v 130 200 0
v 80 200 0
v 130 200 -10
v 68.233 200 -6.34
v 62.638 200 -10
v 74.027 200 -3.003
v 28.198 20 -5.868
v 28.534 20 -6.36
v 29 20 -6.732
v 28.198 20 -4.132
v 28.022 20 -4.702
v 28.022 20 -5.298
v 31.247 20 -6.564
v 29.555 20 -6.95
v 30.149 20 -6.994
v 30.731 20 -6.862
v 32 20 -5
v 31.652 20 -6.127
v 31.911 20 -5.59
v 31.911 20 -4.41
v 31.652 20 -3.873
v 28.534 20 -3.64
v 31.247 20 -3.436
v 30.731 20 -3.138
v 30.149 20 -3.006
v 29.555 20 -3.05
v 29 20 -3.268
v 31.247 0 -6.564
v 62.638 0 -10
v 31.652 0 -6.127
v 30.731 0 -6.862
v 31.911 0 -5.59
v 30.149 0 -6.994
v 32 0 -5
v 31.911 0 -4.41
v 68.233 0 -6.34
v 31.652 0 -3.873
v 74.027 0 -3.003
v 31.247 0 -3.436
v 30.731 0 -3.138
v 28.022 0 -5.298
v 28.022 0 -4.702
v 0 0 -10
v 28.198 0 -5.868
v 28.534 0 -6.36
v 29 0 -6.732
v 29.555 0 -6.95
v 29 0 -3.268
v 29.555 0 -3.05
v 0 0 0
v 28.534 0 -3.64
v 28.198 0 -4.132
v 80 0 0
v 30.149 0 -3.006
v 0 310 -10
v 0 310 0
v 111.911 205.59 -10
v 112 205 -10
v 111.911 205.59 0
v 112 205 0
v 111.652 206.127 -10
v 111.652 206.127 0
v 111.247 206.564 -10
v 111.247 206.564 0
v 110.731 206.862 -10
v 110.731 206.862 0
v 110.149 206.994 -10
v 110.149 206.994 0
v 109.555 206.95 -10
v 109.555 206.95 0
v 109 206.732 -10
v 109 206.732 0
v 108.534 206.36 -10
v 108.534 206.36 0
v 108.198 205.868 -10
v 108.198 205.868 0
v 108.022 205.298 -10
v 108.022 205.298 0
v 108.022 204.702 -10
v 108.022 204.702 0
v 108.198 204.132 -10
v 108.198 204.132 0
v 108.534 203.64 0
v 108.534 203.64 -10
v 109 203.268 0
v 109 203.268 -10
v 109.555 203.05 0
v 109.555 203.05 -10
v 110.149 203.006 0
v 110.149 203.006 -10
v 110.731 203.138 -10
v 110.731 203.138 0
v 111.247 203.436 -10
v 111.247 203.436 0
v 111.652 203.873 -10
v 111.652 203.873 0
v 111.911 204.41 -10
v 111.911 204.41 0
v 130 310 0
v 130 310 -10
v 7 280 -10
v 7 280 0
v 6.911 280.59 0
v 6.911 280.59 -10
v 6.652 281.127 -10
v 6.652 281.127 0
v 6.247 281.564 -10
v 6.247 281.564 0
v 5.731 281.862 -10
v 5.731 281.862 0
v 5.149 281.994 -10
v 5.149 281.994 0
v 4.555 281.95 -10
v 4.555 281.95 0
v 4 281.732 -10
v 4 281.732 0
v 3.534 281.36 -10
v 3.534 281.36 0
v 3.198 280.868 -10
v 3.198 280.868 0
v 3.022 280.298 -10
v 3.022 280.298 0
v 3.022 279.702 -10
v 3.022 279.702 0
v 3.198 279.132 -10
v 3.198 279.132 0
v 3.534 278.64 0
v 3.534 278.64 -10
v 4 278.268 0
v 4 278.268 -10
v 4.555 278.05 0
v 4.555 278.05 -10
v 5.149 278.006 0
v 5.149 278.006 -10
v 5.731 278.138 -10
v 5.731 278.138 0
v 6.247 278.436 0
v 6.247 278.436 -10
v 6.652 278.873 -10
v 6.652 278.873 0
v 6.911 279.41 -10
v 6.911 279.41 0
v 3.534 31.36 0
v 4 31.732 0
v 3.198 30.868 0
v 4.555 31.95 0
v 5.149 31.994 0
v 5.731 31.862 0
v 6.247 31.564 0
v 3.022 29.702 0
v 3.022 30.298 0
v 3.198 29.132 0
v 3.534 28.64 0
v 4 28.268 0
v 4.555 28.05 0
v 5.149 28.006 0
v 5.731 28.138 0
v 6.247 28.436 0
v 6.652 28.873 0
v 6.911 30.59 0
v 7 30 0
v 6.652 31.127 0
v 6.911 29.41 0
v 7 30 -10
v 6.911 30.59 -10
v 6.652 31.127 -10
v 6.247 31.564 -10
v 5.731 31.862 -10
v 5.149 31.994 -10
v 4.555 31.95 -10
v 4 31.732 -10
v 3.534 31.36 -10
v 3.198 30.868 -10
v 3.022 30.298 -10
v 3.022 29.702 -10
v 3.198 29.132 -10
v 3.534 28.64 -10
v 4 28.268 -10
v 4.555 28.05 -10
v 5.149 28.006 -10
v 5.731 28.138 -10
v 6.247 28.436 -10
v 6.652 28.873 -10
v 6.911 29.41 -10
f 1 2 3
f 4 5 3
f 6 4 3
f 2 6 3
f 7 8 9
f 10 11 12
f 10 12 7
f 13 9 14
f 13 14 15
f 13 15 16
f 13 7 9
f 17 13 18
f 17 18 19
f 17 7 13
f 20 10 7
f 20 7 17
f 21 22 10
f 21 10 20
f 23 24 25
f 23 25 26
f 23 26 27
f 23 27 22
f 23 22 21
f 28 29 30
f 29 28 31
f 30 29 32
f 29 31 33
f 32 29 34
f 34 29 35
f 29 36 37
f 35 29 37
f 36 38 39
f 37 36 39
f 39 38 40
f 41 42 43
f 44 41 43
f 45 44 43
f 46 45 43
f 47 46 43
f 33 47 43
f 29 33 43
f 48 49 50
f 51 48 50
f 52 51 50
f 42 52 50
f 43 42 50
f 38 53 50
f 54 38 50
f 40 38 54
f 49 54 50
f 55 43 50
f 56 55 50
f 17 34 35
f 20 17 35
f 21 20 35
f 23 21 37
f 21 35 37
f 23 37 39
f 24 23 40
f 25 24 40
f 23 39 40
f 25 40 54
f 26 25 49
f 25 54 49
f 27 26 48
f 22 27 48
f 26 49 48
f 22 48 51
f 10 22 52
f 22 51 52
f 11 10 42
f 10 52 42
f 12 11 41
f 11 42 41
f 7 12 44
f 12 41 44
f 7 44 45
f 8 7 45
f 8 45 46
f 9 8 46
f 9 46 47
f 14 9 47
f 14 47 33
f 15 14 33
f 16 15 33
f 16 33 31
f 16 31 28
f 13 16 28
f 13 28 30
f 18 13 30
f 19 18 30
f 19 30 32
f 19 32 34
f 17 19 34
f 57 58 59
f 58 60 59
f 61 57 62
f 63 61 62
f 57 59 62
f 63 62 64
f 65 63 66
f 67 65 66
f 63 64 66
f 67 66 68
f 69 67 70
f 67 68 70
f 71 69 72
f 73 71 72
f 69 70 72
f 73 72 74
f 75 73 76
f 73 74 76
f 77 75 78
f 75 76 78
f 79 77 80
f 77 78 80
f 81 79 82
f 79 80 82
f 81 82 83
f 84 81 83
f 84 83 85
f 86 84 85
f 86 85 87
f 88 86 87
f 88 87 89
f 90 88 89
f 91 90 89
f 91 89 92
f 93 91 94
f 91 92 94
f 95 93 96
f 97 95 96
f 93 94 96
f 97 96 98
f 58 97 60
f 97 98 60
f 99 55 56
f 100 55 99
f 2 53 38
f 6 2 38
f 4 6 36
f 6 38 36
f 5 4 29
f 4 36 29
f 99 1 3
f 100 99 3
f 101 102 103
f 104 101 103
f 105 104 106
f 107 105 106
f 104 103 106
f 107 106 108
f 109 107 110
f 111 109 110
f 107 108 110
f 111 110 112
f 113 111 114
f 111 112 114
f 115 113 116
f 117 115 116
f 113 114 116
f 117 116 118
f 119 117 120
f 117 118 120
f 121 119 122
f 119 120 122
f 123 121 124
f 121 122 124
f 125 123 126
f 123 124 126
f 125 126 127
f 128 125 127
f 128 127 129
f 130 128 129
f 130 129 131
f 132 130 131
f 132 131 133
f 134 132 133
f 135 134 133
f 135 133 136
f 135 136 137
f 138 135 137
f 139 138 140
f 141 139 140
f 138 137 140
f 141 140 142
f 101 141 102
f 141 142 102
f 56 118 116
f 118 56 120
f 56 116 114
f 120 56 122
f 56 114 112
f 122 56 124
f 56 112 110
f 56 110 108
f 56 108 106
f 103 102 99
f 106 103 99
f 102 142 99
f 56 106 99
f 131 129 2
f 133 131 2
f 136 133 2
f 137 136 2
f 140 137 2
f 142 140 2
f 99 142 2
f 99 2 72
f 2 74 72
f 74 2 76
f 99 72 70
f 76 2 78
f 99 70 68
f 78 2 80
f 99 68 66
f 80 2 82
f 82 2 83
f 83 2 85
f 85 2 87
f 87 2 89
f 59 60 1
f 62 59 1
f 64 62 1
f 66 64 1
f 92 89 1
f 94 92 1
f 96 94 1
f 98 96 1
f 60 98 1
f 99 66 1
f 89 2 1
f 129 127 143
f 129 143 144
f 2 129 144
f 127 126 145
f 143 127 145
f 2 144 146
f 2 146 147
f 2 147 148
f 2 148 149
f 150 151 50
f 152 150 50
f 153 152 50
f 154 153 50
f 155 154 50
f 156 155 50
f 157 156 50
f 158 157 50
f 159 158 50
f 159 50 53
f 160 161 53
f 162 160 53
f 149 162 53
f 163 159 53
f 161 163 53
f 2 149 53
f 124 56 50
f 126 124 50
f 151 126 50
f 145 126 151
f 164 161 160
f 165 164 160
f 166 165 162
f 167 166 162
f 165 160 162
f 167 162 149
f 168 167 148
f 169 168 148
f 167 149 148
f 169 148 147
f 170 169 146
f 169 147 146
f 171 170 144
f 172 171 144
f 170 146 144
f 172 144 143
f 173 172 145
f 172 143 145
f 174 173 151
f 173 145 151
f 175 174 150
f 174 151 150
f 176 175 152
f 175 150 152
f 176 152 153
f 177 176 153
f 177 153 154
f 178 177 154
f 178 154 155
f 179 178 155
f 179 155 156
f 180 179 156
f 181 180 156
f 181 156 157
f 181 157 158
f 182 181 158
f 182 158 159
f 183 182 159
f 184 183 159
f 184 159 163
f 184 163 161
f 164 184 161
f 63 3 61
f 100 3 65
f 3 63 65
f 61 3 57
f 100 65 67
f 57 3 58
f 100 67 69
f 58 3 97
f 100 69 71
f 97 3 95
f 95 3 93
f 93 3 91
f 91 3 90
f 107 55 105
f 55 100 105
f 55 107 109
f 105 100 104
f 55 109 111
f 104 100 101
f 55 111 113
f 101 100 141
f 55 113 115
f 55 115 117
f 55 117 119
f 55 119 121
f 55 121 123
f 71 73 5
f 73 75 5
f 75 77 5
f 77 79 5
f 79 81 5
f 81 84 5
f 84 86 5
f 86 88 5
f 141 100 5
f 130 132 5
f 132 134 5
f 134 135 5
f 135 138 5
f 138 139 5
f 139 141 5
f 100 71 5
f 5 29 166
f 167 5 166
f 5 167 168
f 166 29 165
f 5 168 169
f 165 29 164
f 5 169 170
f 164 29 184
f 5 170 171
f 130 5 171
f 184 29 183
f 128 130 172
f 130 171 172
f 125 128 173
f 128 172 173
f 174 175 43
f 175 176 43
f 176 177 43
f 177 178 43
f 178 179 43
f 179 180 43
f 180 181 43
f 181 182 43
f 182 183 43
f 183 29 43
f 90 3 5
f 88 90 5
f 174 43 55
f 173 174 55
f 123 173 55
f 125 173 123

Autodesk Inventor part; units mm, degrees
ref_plane "YZ Plane" through (0, 0, 0) normal (1, 0, 0) x (0, 1, 0)
ref_plane "XZ Plane" through (0, 0, 0) normal (0, 1, 0) x (-1, 0, 0)
ref_plane "XY Plane" through (0, 0, 0) normal (0, 0, 1) x (1, 0, 0)
sketch "Sketch1" plane through (0, 0, 0) normal (0, 1, 0) x (-1, 0, 0)
  line L0 (0, 0) -> (-80, 0)
  line L1 (-80, 0) -> (-80, -10)
  line L2 (-80, -10) -> (0, -10)
  line L3 (0, -10) -> (0, 0)
  arc A0 (-62.6378, -10) -> (-80, 0) centre (-130, -106.8831) ccw
  dimension "d1" = 10
  dimension "d2" = 118
  dimension "d3" = 80
  dimension "d4" = 50
extrude "Extrusion1" add sketch "Sketch1" along normal blind 200 contours L3 L2 A0 L0
sketch "Sketch4" plane through (0, 200, 0) normal (0, 1, 0) x (1, 0, 0)
  line L0 (0, 0) -> (130, 0)
  line L1 (130, 0) -> (130, 10)
  line L2 (130, 10) -> (0, 10)
  line L3 (0, 10) -> (0, 0)
  dimension "d24" = 130
  dimension "d25" = 10
sketch "Sketch3" plane through (0, 0, 0) normal (0, -1, 0) x (1, 0, 0)
  circle A0 centre (30, -5) radius 2
  line L0 (0, 0) -> (80, 0) projected
  line L1 (0, -10) -> (0, 0) projected
  dimension "d19" = 4
  dimension "d20" = 5
  dimension "d21" = 30
extrude "Extrusion3" cut sketch "Sketch3" against normal blind 20
sketch "Sketch2" plane through (0, 0, 0) normal (0, 0, 1) x (1, 0, 0)
  circle A0 centre (5, 30) radius 2
  line L0 (0, 0) -> (0, 200) projected
  line L1 (0, 0) -> (80, 0) projected
  circle A1 centre (5, 280) radius 2
  dimension "d7" = 4
  dimension "d8" = 5
  dimension "d9" = 30
  dimension "d12" = 250
extrude "Extrusion4" add sketch "Sketch4" along normal blind 110
extrude "Extrusion5" cut sketch "Sketch2" against normal through all
sketch "Sketch5" plane through (0, 0, 0) normal (0, 0, 1) x (1, 0, 0)
  circle A0 centre (110, 205) radius 2
  line L0 (130, 200) -> (130, 310) projected
  line L1 (80, 200) -> (130, 200) projected
  point P0 (0, 0)
  dimension "d30" = 4
  dimension "d31" = 20
  dimension "d32" = 5
extrude "Extrusion6" cut sketch "Sketch5" against normal through all
equation "\"d30\" = screws"
equation "\"screws\" = 4"
properties part number "box_front_left"
